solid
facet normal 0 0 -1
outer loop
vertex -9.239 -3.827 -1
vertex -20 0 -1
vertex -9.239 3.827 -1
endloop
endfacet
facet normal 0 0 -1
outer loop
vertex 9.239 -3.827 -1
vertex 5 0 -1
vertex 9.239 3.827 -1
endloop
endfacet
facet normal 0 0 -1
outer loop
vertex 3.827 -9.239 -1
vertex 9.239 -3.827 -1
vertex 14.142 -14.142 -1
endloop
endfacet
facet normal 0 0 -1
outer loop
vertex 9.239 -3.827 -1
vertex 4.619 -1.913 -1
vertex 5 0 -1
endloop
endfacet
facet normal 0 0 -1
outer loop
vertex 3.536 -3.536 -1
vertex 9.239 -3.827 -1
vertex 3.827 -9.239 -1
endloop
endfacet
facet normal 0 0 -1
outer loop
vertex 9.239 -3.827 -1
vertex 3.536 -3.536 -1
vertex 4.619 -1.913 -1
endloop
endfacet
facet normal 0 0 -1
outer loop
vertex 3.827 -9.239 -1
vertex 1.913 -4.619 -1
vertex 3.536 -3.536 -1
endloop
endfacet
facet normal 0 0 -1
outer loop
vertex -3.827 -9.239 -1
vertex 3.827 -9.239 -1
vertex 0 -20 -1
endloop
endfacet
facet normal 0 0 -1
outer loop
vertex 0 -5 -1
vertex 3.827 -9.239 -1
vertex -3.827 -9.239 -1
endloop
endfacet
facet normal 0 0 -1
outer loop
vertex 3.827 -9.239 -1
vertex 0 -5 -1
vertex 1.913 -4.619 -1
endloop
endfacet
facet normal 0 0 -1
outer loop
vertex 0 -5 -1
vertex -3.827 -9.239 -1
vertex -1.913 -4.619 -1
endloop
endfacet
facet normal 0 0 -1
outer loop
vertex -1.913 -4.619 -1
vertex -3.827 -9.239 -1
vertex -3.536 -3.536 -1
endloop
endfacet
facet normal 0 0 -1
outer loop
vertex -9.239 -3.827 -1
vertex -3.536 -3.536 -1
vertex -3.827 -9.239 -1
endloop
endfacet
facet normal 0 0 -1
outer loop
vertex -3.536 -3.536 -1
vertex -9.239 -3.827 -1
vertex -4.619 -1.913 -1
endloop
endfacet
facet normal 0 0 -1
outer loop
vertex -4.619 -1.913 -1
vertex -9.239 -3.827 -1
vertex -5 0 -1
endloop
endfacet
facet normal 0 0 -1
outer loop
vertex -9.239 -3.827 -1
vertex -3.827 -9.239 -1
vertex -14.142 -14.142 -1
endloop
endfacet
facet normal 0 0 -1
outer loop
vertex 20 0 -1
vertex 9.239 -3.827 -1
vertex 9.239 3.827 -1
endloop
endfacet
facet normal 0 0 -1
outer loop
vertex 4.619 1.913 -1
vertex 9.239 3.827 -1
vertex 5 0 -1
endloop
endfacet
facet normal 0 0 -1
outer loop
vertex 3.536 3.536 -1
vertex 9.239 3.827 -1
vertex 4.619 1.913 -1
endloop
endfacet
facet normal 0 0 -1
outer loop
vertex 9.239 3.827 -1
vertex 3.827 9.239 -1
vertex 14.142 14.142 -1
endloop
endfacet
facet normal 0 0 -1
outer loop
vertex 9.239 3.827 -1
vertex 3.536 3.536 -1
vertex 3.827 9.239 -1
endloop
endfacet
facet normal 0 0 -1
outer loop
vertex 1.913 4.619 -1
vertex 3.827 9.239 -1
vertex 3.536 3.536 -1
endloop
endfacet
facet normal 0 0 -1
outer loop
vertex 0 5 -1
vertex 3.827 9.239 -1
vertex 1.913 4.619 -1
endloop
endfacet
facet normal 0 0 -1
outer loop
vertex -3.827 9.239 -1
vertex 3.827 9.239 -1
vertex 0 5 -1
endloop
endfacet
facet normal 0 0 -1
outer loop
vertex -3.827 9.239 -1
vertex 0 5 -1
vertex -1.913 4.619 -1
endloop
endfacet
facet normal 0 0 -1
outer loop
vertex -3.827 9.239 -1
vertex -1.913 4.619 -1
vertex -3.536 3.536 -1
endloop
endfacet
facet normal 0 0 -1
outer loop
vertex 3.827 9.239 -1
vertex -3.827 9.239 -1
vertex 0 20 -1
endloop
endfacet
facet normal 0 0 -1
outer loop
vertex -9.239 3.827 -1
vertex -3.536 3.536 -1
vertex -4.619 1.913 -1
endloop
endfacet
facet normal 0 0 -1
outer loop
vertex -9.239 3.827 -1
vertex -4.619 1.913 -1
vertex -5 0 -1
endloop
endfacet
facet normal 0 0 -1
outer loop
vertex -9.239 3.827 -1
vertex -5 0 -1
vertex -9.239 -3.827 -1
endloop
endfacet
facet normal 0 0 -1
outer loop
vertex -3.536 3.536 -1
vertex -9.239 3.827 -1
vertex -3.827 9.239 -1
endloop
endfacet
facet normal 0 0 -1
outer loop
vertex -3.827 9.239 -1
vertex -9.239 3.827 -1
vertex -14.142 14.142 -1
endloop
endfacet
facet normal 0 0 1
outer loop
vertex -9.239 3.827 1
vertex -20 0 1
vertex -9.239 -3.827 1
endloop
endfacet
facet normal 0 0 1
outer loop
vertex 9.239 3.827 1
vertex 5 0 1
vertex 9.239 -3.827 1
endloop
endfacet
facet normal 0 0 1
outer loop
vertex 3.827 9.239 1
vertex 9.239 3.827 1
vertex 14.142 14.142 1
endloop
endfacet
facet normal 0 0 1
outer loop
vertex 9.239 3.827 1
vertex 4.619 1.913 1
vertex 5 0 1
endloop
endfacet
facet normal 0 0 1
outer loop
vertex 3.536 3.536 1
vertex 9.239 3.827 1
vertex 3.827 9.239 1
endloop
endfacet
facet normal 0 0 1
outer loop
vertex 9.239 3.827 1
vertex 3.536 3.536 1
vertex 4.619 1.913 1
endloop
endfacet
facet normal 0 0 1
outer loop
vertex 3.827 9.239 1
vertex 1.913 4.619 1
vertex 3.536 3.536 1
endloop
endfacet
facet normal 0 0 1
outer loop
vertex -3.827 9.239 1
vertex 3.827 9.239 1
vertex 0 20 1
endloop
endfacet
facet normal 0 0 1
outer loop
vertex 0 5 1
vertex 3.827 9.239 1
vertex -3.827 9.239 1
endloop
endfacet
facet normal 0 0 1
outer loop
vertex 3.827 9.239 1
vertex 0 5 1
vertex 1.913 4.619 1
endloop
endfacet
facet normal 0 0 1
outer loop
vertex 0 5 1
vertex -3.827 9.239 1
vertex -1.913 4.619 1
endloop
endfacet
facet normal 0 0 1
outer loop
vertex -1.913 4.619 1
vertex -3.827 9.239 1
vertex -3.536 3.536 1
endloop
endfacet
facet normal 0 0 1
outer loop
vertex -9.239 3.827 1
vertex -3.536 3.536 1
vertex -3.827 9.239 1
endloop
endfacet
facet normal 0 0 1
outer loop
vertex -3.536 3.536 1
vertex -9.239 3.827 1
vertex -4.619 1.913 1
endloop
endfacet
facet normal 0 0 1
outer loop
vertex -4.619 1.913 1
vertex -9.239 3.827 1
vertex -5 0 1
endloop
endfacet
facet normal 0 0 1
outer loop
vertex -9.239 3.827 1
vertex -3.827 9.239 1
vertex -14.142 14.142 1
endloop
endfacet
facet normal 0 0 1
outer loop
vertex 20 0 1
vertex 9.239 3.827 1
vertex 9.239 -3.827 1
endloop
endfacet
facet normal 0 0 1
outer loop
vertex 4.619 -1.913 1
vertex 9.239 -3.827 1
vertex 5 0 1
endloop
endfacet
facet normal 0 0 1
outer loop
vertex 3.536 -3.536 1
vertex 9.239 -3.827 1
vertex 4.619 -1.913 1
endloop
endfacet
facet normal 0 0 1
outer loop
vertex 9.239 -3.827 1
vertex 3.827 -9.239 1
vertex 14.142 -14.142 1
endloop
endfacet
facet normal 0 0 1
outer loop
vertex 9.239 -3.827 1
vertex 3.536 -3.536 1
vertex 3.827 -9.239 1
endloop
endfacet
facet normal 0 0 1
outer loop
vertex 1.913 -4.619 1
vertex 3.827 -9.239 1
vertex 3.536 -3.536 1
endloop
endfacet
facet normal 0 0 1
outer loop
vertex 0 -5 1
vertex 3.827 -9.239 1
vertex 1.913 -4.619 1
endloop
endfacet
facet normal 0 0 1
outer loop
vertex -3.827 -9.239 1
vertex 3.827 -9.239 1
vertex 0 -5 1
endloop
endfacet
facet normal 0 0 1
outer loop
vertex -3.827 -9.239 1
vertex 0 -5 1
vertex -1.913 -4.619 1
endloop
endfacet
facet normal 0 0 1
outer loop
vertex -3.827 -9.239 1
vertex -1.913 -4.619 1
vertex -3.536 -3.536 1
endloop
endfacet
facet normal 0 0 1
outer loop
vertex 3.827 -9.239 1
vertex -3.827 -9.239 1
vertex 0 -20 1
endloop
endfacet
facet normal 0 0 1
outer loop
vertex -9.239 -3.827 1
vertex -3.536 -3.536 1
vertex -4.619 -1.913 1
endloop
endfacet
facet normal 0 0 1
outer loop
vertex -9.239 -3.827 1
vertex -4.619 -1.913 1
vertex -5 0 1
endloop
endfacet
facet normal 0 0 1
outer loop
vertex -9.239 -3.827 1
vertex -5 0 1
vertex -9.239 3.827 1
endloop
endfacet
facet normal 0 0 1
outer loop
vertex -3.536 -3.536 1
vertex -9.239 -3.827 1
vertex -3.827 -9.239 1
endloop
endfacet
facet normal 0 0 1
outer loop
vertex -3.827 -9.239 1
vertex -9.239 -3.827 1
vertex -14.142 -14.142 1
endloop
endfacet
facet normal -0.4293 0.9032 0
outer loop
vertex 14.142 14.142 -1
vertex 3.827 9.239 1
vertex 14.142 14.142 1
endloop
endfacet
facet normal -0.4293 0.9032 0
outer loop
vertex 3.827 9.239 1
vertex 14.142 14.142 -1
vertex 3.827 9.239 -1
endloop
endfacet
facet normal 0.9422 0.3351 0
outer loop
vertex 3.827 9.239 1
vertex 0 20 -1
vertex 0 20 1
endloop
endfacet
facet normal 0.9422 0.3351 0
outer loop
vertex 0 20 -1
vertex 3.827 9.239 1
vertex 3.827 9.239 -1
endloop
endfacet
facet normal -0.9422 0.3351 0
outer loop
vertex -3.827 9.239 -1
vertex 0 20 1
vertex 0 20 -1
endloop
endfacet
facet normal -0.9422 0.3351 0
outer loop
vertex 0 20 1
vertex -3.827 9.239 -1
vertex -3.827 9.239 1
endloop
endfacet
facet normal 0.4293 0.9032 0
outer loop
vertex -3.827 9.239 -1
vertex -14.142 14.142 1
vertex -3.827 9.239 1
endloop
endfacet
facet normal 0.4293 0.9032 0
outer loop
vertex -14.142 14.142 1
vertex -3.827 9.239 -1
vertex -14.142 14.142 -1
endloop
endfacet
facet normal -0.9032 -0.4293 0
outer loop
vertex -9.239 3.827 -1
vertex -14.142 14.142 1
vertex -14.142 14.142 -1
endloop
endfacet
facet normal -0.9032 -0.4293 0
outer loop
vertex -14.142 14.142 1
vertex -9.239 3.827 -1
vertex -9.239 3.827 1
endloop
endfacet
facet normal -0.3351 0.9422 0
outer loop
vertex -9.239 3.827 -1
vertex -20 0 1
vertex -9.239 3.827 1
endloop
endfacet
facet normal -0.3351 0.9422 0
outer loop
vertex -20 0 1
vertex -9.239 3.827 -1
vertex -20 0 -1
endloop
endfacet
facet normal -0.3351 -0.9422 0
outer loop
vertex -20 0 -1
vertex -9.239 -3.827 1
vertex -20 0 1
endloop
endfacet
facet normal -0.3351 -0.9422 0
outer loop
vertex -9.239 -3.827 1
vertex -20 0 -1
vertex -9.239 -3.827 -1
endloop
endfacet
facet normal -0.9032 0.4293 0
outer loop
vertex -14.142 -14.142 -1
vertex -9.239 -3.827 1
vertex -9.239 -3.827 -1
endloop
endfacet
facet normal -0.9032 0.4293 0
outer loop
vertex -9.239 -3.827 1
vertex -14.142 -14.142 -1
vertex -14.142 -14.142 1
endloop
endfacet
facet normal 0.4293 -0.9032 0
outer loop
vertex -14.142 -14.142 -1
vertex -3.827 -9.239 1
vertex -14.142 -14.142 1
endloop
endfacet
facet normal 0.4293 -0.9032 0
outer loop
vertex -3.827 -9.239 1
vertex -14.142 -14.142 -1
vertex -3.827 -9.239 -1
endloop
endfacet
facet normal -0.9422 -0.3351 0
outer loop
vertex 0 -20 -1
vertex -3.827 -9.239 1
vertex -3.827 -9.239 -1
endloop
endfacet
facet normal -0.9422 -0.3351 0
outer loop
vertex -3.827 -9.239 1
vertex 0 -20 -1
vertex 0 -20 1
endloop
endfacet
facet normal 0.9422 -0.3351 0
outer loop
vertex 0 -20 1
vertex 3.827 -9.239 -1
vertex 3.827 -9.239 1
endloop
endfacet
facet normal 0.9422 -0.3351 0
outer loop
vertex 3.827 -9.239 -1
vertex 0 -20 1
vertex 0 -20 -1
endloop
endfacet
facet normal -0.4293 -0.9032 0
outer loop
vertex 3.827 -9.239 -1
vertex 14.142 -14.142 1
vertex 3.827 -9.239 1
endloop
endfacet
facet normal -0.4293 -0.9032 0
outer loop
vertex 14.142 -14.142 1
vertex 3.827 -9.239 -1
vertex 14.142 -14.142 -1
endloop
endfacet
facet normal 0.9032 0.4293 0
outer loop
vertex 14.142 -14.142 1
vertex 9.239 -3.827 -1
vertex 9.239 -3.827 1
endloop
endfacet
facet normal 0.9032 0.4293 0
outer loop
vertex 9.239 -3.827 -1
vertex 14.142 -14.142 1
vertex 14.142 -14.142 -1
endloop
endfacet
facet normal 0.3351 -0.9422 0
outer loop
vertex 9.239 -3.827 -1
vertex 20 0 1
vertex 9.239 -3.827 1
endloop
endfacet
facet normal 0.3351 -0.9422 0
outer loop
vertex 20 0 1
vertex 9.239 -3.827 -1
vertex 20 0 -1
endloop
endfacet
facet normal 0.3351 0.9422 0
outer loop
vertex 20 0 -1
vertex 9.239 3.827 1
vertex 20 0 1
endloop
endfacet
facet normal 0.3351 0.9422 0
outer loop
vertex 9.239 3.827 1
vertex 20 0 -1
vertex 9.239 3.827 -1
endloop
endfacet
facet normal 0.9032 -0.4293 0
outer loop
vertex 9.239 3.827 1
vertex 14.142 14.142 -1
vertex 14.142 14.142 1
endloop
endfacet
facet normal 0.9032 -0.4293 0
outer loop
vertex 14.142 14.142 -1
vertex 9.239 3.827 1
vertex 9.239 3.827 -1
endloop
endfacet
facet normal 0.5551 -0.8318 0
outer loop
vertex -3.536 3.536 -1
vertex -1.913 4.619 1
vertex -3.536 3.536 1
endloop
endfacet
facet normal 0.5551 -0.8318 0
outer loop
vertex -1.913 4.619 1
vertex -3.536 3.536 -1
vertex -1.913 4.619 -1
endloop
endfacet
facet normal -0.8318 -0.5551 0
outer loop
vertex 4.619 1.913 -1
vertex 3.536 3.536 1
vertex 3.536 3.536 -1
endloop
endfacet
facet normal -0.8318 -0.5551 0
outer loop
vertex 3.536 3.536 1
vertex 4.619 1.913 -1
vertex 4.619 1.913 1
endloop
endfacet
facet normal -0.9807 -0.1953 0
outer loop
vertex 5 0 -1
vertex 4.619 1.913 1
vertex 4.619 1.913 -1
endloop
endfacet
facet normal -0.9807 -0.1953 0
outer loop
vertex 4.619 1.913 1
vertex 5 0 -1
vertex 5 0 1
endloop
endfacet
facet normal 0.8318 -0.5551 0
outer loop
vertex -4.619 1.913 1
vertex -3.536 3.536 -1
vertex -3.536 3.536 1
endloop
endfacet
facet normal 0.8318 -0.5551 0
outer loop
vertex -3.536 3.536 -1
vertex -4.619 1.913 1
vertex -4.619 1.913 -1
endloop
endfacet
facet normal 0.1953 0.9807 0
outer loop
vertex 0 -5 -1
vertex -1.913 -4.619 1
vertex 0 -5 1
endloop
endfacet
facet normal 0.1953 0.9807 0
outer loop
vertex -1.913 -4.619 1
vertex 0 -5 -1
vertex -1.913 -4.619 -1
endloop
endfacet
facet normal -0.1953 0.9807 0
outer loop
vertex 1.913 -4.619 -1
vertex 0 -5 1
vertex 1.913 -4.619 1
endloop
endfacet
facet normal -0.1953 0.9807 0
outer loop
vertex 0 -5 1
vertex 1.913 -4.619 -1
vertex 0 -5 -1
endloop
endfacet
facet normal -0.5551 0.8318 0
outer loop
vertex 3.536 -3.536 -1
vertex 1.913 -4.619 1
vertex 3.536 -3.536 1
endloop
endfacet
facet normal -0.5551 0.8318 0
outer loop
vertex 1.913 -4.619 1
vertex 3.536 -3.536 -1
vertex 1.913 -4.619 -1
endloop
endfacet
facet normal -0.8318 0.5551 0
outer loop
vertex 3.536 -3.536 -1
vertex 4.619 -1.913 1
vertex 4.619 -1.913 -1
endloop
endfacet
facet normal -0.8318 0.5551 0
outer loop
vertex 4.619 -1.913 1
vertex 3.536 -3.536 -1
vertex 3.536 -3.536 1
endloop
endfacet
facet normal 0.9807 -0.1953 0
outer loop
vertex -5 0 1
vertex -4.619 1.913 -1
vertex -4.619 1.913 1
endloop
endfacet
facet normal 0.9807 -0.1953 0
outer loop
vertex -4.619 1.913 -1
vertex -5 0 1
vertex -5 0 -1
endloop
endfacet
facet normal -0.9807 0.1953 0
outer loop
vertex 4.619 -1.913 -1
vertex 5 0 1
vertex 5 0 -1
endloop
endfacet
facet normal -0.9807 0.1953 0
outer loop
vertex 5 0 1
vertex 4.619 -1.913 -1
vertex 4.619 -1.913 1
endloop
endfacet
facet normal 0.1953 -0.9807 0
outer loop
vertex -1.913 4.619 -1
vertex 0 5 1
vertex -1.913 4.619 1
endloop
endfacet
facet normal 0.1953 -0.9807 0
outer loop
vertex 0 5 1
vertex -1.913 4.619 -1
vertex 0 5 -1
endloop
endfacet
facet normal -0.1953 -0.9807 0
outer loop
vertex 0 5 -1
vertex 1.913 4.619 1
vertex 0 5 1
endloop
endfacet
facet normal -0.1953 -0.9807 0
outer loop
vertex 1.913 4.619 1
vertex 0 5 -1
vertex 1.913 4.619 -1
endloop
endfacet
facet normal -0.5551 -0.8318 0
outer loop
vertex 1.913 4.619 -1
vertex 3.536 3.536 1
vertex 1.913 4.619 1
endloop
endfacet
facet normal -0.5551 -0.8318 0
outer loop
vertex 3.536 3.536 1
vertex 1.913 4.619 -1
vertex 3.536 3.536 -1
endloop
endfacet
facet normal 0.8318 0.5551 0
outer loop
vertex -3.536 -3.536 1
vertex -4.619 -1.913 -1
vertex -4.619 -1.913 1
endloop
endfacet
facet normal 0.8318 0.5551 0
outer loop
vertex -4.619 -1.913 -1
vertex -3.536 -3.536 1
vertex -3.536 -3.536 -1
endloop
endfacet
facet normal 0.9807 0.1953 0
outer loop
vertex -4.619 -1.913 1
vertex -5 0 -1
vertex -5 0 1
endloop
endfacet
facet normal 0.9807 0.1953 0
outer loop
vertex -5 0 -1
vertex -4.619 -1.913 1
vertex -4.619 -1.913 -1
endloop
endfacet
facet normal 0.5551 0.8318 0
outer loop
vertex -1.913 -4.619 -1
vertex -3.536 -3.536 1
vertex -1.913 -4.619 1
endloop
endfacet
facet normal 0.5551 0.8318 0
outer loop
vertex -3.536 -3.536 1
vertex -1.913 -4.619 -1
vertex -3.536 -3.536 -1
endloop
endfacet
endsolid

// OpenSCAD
/*
 * downloaded from: https://gist.github.com/anoved/9622826
 * 
 * author: Jim (anoved)
 */

// points = number of points (minimum 3)
// outer  = radius to outer points
// inner  = radius to inner points
module Star(points, outer, inner) {
    
    // polar to cartesian: radius/angle to x/y
    function x(r, a) = r * cos(a);
    function y(r, a) = r * sin(a);
    
    // angular width of each pie slice of the star
    increment = 360/points;
    
    union() {
        for (p = [0 : points-1]) {
            
            // outer is outer point p
            // inner is inner point following p
            // next is next outer point following p

            assign( x_outer = x(outer, increment * p),
                    y_outer = y(outer, increment * p),
                    x_inner = x(inner, (increment * p) + (increment/2)),
                    y_inner = y(inner, (increment * p) + (increment/2)),
                    x_next  = x(outer, increment * (p+1)),
                    y_next  = y(outer, increment * (p+1))) {
                polygon(points = [[x_outer, y_outer], [x_inner, y_inner], [x_next, y_next], [0, 0]], paths  = [[0, 1, 2, 3]]);
            }
        }
    }
}


difference() {
    linear_extrude(height=2, center=true)
        Star(8,20,10);
    cylinder(d=10,h=4,center=true);
}
